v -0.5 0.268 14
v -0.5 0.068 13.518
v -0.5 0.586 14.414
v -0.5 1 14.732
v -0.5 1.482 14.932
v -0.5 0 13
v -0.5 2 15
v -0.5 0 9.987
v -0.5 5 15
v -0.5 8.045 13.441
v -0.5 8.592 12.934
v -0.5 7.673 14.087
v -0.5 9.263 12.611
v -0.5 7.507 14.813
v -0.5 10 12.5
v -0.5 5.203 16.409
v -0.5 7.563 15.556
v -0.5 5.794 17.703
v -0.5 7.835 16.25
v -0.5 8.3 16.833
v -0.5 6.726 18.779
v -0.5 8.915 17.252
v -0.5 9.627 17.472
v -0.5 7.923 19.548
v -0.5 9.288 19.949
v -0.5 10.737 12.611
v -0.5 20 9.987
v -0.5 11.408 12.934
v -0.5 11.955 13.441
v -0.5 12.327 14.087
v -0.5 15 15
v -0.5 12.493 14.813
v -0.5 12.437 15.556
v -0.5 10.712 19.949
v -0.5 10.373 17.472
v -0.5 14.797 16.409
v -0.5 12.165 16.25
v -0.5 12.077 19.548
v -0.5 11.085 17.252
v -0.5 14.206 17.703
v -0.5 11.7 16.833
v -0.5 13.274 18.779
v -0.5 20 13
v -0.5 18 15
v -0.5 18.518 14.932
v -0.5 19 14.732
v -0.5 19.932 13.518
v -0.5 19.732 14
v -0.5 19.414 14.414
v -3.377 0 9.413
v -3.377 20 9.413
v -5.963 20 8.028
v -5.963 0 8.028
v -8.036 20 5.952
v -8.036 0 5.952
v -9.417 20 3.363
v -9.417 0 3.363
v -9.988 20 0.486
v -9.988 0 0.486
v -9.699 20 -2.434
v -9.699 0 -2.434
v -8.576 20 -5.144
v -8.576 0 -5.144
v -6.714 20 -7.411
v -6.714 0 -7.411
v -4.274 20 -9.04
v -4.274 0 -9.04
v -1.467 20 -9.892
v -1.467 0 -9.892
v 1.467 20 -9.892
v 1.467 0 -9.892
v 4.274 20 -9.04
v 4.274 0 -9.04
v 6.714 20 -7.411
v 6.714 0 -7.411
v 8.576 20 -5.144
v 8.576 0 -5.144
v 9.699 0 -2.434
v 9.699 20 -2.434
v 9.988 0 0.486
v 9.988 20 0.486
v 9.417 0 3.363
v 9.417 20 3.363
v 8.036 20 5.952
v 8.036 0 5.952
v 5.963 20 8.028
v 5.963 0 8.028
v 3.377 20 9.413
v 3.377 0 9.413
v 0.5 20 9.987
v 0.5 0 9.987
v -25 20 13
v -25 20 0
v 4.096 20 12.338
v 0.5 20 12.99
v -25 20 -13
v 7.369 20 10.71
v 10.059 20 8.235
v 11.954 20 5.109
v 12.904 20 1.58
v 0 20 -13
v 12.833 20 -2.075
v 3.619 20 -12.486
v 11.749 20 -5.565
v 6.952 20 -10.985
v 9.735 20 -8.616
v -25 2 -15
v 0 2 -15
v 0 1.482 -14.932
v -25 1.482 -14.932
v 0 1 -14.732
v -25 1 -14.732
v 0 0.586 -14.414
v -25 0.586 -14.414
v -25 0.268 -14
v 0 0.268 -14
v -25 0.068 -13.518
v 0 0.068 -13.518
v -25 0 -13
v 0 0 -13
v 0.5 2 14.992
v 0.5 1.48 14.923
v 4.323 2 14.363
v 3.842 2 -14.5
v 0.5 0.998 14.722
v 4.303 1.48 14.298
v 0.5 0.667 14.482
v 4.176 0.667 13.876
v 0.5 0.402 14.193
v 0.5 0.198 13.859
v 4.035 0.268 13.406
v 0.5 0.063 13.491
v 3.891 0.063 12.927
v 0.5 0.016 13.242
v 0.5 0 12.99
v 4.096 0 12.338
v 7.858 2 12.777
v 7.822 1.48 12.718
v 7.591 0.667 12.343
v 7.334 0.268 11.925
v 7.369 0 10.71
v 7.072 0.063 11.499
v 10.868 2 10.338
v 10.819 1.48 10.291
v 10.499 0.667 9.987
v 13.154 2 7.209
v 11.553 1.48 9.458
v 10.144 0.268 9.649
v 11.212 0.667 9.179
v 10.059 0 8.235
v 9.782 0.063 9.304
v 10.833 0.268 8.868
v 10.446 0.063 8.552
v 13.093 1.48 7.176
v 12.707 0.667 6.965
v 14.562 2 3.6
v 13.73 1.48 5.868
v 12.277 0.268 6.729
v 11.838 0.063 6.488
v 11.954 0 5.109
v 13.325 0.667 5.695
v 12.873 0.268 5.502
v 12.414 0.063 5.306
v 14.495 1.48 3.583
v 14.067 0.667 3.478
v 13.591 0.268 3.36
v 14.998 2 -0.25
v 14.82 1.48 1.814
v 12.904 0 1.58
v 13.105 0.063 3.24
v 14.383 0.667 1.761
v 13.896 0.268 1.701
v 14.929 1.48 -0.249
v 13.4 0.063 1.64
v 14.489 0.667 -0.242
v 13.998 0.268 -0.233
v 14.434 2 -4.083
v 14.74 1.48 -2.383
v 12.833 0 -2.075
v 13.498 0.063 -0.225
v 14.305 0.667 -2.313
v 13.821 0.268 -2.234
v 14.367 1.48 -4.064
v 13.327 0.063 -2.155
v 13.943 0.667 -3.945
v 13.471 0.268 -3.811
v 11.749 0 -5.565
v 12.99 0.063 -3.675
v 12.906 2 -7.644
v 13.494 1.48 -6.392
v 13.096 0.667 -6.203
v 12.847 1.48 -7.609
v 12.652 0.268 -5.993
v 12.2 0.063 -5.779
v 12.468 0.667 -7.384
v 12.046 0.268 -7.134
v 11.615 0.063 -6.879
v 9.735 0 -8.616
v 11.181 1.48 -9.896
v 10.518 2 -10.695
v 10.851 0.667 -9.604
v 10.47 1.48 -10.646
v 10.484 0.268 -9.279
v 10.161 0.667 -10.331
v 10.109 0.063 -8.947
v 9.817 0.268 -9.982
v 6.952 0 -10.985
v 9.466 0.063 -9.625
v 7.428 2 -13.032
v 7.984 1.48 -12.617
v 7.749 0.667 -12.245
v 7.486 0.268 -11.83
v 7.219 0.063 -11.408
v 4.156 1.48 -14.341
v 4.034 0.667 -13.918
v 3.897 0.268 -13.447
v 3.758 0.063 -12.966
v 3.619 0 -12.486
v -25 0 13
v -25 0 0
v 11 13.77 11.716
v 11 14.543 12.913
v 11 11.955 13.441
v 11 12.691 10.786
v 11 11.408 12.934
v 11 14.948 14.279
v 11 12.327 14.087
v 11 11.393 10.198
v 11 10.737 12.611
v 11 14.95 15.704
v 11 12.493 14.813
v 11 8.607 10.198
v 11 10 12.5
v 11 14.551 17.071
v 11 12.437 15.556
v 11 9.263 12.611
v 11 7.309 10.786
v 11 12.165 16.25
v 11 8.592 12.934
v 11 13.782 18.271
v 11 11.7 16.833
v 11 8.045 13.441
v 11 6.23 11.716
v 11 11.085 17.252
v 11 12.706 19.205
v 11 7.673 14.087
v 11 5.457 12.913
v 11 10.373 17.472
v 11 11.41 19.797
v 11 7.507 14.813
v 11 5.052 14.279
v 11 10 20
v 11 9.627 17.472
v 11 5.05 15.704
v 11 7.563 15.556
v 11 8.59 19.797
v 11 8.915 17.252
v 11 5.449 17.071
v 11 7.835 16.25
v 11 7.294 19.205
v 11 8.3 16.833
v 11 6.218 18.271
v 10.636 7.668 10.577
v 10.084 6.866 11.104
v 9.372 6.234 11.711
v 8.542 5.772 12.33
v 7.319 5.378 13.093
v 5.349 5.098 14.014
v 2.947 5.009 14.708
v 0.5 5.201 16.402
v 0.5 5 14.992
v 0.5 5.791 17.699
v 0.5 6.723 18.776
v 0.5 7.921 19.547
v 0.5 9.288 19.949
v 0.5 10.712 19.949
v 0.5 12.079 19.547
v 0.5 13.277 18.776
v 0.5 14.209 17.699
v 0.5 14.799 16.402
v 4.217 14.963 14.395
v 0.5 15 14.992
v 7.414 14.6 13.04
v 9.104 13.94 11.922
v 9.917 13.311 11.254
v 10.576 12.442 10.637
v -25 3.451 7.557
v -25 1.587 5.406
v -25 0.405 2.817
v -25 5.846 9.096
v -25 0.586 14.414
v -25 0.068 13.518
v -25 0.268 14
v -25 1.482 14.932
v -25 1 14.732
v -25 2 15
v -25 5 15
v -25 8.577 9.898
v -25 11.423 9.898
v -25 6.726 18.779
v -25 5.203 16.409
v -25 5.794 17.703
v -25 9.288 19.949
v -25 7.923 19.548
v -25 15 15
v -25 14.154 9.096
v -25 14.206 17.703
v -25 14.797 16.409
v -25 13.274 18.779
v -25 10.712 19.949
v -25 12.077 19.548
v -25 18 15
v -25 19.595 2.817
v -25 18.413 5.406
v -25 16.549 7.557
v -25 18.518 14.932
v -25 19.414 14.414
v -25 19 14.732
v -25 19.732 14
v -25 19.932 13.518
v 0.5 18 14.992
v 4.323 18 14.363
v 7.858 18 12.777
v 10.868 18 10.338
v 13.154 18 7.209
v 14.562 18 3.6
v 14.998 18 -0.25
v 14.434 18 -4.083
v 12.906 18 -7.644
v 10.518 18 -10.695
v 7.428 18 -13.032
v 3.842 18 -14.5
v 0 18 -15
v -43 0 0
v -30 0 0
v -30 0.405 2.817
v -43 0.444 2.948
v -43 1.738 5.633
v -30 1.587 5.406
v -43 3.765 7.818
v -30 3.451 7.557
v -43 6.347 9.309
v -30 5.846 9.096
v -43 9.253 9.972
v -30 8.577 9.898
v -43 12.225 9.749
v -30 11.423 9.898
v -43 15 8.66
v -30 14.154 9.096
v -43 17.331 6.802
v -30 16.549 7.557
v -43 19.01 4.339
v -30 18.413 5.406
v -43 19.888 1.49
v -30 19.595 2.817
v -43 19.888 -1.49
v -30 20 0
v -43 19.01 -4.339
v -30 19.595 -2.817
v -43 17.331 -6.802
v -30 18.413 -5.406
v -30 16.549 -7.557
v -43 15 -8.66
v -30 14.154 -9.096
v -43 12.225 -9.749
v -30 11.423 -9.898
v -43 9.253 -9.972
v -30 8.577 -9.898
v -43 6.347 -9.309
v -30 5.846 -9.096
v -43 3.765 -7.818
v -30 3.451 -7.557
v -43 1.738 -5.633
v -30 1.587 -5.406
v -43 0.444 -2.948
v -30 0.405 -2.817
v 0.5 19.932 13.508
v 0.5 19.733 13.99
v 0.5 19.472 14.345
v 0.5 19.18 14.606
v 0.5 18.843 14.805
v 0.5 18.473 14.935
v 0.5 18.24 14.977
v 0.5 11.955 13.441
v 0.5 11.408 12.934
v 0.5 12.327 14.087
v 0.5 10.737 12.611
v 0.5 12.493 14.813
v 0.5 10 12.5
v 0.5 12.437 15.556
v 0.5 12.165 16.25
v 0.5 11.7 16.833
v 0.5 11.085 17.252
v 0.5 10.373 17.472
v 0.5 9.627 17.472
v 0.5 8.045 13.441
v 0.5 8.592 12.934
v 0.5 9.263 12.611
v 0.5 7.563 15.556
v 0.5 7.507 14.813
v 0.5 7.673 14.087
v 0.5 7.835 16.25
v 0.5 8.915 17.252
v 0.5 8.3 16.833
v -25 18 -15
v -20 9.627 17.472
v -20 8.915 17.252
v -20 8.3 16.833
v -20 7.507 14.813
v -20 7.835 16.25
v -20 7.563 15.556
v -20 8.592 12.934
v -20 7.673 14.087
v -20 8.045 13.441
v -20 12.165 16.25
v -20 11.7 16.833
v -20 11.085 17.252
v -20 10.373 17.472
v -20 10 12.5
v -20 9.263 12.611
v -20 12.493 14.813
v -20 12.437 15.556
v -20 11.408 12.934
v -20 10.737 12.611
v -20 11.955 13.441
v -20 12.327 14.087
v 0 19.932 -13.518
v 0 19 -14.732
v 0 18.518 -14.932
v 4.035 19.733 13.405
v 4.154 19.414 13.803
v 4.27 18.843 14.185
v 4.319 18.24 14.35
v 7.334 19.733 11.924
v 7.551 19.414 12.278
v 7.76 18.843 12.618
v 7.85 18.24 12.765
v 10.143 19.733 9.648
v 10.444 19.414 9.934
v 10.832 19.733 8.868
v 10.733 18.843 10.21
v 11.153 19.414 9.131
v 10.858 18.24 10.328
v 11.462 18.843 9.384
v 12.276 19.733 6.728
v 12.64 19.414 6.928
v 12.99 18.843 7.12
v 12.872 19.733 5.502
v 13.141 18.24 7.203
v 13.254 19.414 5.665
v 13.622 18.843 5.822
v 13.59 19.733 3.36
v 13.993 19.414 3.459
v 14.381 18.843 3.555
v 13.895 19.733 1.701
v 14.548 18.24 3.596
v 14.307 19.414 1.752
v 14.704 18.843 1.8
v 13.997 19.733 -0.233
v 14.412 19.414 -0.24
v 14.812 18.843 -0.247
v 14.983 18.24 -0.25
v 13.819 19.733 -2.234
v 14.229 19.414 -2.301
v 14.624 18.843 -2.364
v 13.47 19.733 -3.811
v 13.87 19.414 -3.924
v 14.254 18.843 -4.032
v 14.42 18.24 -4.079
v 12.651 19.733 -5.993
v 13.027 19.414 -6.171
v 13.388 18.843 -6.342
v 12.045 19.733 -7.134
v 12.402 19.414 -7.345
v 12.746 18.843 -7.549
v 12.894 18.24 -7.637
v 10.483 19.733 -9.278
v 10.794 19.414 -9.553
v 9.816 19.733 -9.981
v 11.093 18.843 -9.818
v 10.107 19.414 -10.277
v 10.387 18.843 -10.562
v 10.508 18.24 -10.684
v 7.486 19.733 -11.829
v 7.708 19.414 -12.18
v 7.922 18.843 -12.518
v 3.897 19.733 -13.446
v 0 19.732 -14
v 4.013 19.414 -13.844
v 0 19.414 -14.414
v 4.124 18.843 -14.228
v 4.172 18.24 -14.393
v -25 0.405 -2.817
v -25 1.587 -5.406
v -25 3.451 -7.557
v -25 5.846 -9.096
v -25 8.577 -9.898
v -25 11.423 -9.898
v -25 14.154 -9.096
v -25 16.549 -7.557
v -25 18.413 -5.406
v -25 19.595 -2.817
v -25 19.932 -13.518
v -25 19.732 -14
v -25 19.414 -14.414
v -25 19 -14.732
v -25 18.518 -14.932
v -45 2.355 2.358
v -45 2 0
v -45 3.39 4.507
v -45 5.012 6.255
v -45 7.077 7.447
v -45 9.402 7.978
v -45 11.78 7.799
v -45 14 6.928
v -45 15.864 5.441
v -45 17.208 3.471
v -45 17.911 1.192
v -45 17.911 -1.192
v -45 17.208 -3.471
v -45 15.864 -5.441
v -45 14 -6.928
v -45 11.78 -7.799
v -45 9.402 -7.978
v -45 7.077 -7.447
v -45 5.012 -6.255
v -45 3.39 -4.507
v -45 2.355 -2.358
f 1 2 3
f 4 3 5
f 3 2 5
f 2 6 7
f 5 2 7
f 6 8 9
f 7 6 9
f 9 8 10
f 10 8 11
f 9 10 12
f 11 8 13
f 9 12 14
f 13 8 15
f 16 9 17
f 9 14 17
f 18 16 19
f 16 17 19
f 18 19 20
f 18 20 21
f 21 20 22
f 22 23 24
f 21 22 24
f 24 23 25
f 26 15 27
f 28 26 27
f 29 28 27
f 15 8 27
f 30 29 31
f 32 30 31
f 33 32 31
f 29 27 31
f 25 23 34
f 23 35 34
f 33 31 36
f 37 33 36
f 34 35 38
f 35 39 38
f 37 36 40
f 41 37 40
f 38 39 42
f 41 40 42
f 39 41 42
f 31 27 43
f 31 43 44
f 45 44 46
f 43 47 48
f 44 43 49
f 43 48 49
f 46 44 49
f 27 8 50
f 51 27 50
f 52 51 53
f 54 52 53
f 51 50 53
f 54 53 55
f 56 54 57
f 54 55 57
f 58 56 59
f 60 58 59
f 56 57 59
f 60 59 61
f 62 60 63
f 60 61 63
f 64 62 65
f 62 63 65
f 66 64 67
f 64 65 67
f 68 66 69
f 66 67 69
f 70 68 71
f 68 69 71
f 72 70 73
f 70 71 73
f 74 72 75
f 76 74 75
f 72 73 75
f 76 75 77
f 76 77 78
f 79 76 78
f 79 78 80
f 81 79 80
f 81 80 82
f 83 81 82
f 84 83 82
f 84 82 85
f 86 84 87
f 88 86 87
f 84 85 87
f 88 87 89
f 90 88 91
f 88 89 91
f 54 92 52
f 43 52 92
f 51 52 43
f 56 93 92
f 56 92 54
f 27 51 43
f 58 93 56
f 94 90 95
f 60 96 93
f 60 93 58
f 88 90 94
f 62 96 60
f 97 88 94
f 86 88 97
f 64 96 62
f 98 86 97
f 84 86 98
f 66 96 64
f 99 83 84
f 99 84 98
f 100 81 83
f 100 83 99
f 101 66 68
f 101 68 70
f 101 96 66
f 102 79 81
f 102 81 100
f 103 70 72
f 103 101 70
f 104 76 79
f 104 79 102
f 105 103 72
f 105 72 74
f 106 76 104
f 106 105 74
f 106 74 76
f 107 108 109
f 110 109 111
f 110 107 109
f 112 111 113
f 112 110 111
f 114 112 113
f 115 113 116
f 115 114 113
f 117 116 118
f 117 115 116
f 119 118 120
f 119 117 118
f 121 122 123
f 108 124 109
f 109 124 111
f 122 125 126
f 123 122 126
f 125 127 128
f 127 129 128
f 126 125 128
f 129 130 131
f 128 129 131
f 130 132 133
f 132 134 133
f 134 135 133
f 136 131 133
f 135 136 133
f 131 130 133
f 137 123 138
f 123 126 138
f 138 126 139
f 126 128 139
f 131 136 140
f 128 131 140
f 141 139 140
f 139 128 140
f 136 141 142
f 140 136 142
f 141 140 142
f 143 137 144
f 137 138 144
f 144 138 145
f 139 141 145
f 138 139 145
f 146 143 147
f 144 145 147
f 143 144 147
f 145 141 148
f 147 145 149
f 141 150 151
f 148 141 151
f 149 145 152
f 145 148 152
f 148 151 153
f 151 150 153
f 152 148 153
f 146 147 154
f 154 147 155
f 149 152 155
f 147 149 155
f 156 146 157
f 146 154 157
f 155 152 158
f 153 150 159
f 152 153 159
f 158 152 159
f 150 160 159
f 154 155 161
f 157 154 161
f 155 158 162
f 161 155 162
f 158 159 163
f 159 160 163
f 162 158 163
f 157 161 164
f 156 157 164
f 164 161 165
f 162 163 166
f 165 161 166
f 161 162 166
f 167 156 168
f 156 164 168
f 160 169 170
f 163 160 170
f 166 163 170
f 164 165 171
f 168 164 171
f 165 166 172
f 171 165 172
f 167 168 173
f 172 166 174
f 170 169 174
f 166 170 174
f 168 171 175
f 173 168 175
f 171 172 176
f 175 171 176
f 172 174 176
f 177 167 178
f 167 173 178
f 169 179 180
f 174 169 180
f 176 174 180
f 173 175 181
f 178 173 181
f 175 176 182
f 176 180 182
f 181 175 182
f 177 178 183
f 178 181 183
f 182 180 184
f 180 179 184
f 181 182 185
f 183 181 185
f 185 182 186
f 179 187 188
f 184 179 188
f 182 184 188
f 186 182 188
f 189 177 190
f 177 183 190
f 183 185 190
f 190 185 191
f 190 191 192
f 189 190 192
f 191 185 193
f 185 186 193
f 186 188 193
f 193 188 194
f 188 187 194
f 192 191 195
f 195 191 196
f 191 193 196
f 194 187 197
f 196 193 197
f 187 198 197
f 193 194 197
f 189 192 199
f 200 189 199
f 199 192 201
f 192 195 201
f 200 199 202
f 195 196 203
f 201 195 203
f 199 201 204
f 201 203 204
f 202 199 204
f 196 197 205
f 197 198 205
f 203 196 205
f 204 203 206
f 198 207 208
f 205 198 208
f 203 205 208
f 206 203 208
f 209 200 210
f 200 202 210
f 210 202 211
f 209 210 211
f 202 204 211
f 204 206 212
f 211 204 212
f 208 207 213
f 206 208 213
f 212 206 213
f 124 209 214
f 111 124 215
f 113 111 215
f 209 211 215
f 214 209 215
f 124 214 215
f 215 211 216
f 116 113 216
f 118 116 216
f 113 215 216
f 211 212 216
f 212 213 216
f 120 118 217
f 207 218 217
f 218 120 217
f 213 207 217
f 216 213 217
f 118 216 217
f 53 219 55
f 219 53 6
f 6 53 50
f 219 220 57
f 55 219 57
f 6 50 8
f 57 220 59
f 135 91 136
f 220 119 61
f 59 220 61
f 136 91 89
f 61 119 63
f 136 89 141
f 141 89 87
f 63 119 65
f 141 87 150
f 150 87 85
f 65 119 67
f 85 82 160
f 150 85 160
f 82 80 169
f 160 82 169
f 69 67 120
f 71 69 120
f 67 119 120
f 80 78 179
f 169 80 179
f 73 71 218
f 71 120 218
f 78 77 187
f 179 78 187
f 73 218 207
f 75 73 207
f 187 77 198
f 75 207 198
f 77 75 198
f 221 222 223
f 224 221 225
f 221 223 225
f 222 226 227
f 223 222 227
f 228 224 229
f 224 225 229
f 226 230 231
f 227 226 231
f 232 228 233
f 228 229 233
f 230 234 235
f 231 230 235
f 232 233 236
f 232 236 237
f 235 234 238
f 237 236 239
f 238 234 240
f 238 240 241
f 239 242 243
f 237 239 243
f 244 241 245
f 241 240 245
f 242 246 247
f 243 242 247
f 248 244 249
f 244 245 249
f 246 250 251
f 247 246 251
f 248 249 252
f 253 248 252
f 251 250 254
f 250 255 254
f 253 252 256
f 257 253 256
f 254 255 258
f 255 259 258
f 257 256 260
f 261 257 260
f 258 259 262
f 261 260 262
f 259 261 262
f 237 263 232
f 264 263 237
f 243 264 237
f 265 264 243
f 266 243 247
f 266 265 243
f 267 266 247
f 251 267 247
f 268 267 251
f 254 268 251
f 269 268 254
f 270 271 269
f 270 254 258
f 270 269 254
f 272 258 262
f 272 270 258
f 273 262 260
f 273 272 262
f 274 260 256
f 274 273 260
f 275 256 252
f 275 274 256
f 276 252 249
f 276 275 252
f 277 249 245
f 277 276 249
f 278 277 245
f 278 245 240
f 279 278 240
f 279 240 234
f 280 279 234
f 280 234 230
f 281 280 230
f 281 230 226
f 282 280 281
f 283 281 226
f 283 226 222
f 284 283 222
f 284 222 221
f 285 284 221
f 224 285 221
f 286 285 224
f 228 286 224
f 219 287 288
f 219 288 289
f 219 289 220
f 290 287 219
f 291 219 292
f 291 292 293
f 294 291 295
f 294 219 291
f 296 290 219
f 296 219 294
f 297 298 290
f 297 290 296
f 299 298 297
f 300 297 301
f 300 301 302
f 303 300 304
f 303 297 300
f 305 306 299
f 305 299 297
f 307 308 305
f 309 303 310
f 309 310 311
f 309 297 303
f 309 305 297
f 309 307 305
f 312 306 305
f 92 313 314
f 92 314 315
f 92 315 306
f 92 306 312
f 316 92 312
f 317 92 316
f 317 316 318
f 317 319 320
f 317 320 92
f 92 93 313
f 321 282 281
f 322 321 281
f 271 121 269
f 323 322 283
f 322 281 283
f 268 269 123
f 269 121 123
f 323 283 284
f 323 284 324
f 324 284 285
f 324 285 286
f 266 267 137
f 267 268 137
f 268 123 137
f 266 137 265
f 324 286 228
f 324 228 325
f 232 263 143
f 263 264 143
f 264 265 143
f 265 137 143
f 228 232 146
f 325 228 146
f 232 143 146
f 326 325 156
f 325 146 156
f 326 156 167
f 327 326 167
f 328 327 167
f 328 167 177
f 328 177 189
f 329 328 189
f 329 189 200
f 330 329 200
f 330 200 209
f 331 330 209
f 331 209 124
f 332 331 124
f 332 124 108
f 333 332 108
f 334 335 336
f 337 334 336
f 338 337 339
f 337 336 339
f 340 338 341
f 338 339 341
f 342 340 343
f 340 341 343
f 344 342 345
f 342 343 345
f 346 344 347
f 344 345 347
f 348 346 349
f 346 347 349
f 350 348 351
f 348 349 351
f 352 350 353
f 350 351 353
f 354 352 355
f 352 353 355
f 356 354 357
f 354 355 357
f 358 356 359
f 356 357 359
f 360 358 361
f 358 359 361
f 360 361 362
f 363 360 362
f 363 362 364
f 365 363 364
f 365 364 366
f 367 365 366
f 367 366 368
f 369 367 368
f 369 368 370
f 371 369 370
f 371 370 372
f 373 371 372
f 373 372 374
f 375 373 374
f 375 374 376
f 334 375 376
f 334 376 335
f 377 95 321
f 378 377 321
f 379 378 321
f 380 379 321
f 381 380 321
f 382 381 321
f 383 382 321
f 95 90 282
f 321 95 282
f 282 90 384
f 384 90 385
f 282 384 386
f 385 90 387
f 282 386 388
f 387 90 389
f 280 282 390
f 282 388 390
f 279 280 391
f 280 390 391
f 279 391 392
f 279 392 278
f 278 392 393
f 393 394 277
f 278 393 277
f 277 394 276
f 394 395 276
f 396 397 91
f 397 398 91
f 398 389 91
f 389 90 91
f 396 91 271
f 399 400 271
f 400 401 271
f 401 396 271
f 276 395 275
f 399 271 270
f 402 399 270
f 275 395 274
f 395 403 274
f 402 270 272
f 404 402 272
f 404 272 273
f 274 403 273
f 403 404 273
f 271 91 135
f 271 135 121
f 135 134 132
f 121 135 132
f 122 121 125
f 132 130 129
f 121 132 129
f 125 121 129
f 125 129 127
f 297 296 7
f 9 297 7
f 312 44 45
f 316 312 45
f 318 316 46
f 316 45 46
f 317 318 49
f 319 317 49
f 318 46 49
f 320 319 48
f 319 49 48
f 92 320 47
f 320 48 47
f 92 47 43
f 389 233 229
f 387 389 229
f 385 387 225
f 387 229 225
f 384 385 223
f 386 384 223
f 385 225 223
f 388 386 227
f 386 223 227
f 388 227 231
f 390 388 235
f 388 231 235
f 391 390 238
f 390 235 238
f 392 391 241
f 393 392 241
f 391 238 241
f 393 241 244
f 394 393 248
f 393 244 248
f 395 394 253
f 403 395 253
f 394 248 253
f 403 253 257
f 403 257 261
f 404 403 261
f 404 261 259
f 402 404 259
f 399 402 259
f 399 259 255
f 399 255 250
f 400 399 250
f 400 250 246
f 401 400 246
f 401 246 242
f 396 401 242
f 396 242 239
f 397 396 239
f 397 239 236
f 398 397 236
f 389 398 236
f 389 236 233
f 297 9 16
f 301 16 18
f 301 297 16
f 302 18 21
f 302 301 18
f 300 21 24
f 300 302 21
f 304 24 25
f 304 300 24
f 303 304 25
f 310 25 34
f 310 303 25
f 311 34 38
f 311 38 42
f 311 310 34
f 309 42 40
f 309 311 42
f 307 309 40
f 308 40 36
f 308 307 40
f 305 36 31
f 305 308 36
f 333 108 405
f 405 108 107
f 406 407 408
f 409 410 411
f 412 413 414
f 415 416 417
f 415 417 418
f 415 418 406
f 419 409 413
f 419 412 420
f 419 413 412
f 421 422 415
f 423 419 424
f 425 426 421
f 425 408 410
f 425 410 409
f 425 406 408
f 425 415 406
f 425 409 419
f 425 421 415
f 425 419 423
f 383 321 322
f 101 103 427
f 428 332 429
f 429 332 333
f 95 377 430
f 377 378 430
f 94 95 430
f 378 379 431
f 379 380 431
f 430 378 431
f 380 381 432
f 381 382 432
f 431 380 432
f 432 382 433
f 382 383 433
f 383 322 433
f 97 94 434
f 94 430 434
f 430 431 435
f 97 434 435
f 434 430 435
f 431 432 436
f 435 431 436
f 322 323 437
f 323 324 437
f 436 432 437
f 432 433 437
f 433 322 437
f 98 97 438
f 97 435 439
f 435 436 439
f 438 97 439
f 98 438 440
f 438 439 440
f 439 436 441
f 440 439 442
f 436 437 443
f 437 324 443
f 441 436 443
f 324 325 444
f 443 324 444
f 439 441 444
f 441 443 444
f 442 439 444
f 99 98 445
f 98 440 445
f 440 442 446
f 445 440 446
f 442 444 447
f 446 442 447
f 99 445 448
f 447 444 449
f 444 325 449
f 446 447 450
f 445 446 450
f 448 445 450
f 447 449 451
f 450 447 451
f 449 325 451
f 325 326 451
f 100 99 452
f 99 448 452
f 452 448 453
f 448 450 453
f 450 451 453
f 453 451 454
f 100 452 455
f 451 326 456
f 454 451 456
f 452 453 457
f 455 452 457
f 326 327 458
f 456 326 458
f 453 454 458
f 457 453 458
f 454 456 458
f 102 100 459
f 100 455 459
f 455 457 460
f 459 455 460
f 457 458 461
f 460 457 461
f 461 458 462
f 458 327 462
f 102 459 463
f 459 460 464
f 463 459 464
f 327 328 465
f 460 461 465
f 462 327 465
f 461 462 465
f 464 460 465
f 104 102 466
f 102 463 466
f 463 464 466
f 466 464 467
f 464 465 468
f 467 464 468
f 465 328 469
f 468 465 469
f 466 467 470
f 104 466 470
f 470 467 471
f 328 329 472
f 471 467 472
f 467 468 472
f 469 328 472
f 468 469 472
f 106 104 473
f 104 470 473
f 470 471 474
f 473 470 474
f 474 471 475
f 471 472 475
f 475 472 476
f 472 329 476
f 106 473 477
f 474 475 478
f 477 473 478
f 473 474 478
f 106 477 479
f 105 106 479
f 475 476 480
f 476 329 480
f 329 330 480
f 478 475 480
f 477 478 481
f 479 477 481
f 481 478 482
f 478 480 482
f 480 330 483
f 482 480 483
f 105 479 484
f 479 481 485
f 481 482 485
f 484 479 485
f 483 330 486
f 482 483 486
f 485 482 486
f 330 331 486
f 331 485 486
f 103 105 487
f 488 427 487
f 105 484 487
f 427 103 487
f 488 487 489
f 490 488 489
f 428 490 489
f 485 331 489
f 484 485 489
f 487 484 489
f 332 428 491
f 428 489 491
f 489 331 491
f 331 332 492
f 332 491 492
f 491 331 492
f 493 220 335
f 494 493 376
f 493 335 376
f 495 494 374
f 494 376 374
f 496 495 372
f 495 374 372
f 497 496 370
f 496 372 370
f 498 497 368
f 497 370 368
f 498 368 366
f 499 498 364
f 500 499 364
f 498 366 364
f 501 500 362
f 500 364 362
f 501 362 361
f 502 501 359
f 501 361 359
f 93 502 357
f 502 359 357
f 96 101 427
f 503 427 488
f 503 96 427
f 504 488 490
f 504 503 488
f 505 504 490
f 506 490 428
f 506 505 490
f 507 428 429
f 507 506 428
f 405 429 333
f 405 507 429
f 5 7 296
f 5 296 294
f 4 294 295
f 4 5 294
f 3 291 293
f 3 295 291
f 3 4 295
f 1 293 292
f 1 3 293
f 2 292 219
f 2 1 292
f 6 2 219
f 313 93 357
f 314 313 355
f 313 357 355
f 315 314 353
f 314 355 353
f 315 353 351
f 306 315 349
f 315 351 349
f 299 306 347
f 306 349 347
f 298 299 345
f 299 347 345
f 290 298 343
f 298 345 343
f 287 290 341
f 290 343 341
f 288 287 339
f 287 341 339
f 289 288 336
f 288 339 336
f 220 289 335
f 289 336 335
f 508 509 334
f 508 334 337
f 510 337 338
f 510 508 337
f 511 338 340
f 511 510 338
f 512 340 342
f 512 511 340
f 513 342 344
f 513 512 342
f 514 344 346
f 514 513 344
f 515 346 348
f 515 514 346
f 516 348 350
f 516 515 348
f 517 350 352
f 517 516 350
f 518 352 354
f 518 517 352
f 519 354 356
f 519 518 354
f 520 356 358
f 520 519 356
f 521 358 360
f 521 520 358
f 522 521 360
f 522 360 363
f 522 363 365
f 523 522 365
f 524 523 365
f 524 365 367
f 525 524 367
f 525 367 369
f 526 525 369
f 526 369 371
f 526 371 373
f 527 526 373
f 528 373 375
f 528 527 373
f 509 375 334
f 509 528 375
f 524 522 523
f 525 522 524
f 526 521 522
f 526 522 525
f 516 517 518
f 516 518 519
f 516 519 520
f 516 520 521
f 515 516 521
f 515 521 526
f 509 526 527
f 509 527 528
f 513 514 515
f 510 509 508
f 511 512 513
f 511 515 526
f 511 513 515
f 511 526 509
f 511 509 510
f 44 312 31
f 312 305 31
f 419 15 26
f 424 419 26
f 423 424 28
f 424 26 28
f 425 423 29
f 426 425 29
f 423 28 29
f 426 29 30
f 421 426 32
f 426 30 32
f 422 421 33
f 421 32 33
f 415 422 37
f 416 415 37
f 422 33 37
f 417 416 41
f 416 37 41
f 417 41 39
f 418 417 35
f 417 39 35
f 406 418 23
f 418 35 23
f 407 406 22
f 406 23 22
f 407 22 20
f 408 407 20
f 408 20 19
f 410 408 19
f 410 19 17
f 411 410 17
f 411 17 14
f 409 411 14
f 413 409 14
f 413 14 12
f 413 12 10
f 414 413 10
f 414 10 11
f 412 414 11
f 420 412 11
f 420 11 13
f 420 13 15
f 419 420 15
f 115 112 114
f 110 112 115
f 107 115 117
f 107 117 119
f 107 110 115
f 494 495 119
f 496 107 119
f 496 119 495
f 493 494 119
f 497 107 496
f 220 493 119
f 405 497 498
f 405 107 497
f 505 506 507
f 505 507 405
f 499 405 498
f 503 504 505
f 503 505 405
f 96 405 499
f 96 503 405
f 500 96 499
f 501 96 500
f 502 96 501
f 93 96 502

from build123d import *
from build123d.topology import SkipClean

# Parameters (mm, degrees)
BOSS_EXTRUDE1_DEPTH = 20
SKETCH2_R           = 5
BOSS_EXTRUDE2_DEPTH = 41
CUT_EXTRUDE1_DEPTH  = 41
SKETCH4_R           = 2.5
CUT_EXTRUDE2_DEPTH  = 31
FILLET1_R           = 2
SKETCH5_R           = 10
BOSS_EXTRUDE3_DEPTH = 15
CUT_EXTRUDE3_DEPTH  = 5
CHAMFER1_SIZE       = 2


with BuildPart() as part:
    # Sketch1 → Boss-Extrude1 (new body)
    with BuildSketch(Plane(origin=(0, 0, 0), x_dir=(1, 0, 0), z_dir=(0, 1, 0))):
        with BuildLine():
            ThreePointArc((0.5, -14.991664351), (14.997915943, 0.250034739), (0, 15))
            Line((0, 15), (-30, 15))
            Line((-30, 15), (-30, -15))
            Line((-30, -15), (-0.5, -15))
            Line((-0.5, -15), (-0.5, -9.987492178))
            ThreePointArc((-0.5, -9.987492178), (0, 10), (0.5, -9.987492178))
            Line((0.5, -9.987492178), (0.5, -14.991664351))
        make_face()
    extrude(amount=BOSS_EXTRUDE1_DEPTH)

    # Sketch2 → Boss-Extrude2 (add)
    with BuildSketch(Plane.ZY.offset(30)):
        with Locations(Location((15, 10, 0), (0, 0, 270))):
            Circle(SKETCH2_R)
    extrude(amount=-BOSS_EXTRUDE2_DEPTH)

    # Sketch3 → Cut-Extrude1 (cut)
    with BuildSketch(Plane(origin=(0, 20, 0), x_dir=(1, 0, 0), z_dir=(0, 1, 0))):
        Polygon((-0.5, -15), (-0.5, -9.987492178), (0.5, -9.987492178), (0.5, -14.991664351), (0.5, -20), (-0.5, -20), align=None)
    extrude(amount=-CUT_EXTRUDE1_DEPTH, mode=Mode.SUBTRACT)

    # Sketch4 → Cut-Extrude2 (cut)
    with BuildSketch(Plane(origin=(11, 0, 0), x_dir=(0, 0, -1), z_dir=(1, 0, 0))):
        with Locations((-15, 10)):
            Circle(SKETCH4_R)
    extrude(amount=-CUT_EXTRUDE2_DEPTH, mode=Mode.SUBTRACT)

    # Fillet1
    fillet1_edges = [part.edges().sort_by_distance(p)[0] for p in [
        (-15, 0, -15),
        (14.997915943, 0, -0.250034739),
        (-15, 20, -15),
        (-15.25, 20, 15),
        (14.997915943, 20, -0.250034739),
        (-15.25, 0, 15),
    ]]
    fillet(fillet1_edges, radius=FILLET1_R)

    # Sketch5 → Boss-Extrude3 (add)
    with BuildSketch(Plane.ZY.offset(30)):
        with Locations(Location((0, 10, 0), (0, 0, 270))):
            Circle(SKETCH5_R)
    extrude(amount=BOSS_EXTRUDE3_DEPTH)

    # Sketch6 → Cut-Extrude3 (cut)
    with SkipClean():  # the faces are left unmerged after this step: merging them gives an invalid solid
        with BuildSketch(Plane.ZY.offset(30)):
            with BuildLine():
                ThreePointArc((0, 0), (-10, 10), (0, 20))
                Line((0, 20), (-13, 20))
                ThreePointArc((-13, 20), (-14.414213562, 19.414213562), (-15, 18))
                Line((-15, 18), (-15, 2))
                ThreePointArc((-15, 2), (-14.414213562, 0.585786438), (-13, 0))
                Line((-13, 0), (0, 0))
            make_face()
            with BuildLine():
                Line((13, 20), (0, 20))
                ThreePointArc((0, 20), (10, 10), (0, 0))
                Line((0, 0), (13, 0))
                ThreePointArc((13, 0), (14.414213562, 0.585786438), (15, 2))
                Line((15, 2), (15, 5))
                ThreePointArc((15, 5), (20, 10), (15, 15))
                Line((15, 15), (15, 18))
                ThreePointArc((15, 18), (14.414213562, 19.414213562), (13, 20))
            make_face()
        extrude(amount=-CUT_EXTRUDE3_DEPTH, mode=Mode.SUBTRACT)

    # Chamfer1
    chamfer1_edges = [part.edges().sort_by_distance(p)[0] for p in [
        (-45, 20, 0),
    ]]
    chamfer(chamfer1_edges, length=CHAMFER1_SIZE)


solid = part.part
